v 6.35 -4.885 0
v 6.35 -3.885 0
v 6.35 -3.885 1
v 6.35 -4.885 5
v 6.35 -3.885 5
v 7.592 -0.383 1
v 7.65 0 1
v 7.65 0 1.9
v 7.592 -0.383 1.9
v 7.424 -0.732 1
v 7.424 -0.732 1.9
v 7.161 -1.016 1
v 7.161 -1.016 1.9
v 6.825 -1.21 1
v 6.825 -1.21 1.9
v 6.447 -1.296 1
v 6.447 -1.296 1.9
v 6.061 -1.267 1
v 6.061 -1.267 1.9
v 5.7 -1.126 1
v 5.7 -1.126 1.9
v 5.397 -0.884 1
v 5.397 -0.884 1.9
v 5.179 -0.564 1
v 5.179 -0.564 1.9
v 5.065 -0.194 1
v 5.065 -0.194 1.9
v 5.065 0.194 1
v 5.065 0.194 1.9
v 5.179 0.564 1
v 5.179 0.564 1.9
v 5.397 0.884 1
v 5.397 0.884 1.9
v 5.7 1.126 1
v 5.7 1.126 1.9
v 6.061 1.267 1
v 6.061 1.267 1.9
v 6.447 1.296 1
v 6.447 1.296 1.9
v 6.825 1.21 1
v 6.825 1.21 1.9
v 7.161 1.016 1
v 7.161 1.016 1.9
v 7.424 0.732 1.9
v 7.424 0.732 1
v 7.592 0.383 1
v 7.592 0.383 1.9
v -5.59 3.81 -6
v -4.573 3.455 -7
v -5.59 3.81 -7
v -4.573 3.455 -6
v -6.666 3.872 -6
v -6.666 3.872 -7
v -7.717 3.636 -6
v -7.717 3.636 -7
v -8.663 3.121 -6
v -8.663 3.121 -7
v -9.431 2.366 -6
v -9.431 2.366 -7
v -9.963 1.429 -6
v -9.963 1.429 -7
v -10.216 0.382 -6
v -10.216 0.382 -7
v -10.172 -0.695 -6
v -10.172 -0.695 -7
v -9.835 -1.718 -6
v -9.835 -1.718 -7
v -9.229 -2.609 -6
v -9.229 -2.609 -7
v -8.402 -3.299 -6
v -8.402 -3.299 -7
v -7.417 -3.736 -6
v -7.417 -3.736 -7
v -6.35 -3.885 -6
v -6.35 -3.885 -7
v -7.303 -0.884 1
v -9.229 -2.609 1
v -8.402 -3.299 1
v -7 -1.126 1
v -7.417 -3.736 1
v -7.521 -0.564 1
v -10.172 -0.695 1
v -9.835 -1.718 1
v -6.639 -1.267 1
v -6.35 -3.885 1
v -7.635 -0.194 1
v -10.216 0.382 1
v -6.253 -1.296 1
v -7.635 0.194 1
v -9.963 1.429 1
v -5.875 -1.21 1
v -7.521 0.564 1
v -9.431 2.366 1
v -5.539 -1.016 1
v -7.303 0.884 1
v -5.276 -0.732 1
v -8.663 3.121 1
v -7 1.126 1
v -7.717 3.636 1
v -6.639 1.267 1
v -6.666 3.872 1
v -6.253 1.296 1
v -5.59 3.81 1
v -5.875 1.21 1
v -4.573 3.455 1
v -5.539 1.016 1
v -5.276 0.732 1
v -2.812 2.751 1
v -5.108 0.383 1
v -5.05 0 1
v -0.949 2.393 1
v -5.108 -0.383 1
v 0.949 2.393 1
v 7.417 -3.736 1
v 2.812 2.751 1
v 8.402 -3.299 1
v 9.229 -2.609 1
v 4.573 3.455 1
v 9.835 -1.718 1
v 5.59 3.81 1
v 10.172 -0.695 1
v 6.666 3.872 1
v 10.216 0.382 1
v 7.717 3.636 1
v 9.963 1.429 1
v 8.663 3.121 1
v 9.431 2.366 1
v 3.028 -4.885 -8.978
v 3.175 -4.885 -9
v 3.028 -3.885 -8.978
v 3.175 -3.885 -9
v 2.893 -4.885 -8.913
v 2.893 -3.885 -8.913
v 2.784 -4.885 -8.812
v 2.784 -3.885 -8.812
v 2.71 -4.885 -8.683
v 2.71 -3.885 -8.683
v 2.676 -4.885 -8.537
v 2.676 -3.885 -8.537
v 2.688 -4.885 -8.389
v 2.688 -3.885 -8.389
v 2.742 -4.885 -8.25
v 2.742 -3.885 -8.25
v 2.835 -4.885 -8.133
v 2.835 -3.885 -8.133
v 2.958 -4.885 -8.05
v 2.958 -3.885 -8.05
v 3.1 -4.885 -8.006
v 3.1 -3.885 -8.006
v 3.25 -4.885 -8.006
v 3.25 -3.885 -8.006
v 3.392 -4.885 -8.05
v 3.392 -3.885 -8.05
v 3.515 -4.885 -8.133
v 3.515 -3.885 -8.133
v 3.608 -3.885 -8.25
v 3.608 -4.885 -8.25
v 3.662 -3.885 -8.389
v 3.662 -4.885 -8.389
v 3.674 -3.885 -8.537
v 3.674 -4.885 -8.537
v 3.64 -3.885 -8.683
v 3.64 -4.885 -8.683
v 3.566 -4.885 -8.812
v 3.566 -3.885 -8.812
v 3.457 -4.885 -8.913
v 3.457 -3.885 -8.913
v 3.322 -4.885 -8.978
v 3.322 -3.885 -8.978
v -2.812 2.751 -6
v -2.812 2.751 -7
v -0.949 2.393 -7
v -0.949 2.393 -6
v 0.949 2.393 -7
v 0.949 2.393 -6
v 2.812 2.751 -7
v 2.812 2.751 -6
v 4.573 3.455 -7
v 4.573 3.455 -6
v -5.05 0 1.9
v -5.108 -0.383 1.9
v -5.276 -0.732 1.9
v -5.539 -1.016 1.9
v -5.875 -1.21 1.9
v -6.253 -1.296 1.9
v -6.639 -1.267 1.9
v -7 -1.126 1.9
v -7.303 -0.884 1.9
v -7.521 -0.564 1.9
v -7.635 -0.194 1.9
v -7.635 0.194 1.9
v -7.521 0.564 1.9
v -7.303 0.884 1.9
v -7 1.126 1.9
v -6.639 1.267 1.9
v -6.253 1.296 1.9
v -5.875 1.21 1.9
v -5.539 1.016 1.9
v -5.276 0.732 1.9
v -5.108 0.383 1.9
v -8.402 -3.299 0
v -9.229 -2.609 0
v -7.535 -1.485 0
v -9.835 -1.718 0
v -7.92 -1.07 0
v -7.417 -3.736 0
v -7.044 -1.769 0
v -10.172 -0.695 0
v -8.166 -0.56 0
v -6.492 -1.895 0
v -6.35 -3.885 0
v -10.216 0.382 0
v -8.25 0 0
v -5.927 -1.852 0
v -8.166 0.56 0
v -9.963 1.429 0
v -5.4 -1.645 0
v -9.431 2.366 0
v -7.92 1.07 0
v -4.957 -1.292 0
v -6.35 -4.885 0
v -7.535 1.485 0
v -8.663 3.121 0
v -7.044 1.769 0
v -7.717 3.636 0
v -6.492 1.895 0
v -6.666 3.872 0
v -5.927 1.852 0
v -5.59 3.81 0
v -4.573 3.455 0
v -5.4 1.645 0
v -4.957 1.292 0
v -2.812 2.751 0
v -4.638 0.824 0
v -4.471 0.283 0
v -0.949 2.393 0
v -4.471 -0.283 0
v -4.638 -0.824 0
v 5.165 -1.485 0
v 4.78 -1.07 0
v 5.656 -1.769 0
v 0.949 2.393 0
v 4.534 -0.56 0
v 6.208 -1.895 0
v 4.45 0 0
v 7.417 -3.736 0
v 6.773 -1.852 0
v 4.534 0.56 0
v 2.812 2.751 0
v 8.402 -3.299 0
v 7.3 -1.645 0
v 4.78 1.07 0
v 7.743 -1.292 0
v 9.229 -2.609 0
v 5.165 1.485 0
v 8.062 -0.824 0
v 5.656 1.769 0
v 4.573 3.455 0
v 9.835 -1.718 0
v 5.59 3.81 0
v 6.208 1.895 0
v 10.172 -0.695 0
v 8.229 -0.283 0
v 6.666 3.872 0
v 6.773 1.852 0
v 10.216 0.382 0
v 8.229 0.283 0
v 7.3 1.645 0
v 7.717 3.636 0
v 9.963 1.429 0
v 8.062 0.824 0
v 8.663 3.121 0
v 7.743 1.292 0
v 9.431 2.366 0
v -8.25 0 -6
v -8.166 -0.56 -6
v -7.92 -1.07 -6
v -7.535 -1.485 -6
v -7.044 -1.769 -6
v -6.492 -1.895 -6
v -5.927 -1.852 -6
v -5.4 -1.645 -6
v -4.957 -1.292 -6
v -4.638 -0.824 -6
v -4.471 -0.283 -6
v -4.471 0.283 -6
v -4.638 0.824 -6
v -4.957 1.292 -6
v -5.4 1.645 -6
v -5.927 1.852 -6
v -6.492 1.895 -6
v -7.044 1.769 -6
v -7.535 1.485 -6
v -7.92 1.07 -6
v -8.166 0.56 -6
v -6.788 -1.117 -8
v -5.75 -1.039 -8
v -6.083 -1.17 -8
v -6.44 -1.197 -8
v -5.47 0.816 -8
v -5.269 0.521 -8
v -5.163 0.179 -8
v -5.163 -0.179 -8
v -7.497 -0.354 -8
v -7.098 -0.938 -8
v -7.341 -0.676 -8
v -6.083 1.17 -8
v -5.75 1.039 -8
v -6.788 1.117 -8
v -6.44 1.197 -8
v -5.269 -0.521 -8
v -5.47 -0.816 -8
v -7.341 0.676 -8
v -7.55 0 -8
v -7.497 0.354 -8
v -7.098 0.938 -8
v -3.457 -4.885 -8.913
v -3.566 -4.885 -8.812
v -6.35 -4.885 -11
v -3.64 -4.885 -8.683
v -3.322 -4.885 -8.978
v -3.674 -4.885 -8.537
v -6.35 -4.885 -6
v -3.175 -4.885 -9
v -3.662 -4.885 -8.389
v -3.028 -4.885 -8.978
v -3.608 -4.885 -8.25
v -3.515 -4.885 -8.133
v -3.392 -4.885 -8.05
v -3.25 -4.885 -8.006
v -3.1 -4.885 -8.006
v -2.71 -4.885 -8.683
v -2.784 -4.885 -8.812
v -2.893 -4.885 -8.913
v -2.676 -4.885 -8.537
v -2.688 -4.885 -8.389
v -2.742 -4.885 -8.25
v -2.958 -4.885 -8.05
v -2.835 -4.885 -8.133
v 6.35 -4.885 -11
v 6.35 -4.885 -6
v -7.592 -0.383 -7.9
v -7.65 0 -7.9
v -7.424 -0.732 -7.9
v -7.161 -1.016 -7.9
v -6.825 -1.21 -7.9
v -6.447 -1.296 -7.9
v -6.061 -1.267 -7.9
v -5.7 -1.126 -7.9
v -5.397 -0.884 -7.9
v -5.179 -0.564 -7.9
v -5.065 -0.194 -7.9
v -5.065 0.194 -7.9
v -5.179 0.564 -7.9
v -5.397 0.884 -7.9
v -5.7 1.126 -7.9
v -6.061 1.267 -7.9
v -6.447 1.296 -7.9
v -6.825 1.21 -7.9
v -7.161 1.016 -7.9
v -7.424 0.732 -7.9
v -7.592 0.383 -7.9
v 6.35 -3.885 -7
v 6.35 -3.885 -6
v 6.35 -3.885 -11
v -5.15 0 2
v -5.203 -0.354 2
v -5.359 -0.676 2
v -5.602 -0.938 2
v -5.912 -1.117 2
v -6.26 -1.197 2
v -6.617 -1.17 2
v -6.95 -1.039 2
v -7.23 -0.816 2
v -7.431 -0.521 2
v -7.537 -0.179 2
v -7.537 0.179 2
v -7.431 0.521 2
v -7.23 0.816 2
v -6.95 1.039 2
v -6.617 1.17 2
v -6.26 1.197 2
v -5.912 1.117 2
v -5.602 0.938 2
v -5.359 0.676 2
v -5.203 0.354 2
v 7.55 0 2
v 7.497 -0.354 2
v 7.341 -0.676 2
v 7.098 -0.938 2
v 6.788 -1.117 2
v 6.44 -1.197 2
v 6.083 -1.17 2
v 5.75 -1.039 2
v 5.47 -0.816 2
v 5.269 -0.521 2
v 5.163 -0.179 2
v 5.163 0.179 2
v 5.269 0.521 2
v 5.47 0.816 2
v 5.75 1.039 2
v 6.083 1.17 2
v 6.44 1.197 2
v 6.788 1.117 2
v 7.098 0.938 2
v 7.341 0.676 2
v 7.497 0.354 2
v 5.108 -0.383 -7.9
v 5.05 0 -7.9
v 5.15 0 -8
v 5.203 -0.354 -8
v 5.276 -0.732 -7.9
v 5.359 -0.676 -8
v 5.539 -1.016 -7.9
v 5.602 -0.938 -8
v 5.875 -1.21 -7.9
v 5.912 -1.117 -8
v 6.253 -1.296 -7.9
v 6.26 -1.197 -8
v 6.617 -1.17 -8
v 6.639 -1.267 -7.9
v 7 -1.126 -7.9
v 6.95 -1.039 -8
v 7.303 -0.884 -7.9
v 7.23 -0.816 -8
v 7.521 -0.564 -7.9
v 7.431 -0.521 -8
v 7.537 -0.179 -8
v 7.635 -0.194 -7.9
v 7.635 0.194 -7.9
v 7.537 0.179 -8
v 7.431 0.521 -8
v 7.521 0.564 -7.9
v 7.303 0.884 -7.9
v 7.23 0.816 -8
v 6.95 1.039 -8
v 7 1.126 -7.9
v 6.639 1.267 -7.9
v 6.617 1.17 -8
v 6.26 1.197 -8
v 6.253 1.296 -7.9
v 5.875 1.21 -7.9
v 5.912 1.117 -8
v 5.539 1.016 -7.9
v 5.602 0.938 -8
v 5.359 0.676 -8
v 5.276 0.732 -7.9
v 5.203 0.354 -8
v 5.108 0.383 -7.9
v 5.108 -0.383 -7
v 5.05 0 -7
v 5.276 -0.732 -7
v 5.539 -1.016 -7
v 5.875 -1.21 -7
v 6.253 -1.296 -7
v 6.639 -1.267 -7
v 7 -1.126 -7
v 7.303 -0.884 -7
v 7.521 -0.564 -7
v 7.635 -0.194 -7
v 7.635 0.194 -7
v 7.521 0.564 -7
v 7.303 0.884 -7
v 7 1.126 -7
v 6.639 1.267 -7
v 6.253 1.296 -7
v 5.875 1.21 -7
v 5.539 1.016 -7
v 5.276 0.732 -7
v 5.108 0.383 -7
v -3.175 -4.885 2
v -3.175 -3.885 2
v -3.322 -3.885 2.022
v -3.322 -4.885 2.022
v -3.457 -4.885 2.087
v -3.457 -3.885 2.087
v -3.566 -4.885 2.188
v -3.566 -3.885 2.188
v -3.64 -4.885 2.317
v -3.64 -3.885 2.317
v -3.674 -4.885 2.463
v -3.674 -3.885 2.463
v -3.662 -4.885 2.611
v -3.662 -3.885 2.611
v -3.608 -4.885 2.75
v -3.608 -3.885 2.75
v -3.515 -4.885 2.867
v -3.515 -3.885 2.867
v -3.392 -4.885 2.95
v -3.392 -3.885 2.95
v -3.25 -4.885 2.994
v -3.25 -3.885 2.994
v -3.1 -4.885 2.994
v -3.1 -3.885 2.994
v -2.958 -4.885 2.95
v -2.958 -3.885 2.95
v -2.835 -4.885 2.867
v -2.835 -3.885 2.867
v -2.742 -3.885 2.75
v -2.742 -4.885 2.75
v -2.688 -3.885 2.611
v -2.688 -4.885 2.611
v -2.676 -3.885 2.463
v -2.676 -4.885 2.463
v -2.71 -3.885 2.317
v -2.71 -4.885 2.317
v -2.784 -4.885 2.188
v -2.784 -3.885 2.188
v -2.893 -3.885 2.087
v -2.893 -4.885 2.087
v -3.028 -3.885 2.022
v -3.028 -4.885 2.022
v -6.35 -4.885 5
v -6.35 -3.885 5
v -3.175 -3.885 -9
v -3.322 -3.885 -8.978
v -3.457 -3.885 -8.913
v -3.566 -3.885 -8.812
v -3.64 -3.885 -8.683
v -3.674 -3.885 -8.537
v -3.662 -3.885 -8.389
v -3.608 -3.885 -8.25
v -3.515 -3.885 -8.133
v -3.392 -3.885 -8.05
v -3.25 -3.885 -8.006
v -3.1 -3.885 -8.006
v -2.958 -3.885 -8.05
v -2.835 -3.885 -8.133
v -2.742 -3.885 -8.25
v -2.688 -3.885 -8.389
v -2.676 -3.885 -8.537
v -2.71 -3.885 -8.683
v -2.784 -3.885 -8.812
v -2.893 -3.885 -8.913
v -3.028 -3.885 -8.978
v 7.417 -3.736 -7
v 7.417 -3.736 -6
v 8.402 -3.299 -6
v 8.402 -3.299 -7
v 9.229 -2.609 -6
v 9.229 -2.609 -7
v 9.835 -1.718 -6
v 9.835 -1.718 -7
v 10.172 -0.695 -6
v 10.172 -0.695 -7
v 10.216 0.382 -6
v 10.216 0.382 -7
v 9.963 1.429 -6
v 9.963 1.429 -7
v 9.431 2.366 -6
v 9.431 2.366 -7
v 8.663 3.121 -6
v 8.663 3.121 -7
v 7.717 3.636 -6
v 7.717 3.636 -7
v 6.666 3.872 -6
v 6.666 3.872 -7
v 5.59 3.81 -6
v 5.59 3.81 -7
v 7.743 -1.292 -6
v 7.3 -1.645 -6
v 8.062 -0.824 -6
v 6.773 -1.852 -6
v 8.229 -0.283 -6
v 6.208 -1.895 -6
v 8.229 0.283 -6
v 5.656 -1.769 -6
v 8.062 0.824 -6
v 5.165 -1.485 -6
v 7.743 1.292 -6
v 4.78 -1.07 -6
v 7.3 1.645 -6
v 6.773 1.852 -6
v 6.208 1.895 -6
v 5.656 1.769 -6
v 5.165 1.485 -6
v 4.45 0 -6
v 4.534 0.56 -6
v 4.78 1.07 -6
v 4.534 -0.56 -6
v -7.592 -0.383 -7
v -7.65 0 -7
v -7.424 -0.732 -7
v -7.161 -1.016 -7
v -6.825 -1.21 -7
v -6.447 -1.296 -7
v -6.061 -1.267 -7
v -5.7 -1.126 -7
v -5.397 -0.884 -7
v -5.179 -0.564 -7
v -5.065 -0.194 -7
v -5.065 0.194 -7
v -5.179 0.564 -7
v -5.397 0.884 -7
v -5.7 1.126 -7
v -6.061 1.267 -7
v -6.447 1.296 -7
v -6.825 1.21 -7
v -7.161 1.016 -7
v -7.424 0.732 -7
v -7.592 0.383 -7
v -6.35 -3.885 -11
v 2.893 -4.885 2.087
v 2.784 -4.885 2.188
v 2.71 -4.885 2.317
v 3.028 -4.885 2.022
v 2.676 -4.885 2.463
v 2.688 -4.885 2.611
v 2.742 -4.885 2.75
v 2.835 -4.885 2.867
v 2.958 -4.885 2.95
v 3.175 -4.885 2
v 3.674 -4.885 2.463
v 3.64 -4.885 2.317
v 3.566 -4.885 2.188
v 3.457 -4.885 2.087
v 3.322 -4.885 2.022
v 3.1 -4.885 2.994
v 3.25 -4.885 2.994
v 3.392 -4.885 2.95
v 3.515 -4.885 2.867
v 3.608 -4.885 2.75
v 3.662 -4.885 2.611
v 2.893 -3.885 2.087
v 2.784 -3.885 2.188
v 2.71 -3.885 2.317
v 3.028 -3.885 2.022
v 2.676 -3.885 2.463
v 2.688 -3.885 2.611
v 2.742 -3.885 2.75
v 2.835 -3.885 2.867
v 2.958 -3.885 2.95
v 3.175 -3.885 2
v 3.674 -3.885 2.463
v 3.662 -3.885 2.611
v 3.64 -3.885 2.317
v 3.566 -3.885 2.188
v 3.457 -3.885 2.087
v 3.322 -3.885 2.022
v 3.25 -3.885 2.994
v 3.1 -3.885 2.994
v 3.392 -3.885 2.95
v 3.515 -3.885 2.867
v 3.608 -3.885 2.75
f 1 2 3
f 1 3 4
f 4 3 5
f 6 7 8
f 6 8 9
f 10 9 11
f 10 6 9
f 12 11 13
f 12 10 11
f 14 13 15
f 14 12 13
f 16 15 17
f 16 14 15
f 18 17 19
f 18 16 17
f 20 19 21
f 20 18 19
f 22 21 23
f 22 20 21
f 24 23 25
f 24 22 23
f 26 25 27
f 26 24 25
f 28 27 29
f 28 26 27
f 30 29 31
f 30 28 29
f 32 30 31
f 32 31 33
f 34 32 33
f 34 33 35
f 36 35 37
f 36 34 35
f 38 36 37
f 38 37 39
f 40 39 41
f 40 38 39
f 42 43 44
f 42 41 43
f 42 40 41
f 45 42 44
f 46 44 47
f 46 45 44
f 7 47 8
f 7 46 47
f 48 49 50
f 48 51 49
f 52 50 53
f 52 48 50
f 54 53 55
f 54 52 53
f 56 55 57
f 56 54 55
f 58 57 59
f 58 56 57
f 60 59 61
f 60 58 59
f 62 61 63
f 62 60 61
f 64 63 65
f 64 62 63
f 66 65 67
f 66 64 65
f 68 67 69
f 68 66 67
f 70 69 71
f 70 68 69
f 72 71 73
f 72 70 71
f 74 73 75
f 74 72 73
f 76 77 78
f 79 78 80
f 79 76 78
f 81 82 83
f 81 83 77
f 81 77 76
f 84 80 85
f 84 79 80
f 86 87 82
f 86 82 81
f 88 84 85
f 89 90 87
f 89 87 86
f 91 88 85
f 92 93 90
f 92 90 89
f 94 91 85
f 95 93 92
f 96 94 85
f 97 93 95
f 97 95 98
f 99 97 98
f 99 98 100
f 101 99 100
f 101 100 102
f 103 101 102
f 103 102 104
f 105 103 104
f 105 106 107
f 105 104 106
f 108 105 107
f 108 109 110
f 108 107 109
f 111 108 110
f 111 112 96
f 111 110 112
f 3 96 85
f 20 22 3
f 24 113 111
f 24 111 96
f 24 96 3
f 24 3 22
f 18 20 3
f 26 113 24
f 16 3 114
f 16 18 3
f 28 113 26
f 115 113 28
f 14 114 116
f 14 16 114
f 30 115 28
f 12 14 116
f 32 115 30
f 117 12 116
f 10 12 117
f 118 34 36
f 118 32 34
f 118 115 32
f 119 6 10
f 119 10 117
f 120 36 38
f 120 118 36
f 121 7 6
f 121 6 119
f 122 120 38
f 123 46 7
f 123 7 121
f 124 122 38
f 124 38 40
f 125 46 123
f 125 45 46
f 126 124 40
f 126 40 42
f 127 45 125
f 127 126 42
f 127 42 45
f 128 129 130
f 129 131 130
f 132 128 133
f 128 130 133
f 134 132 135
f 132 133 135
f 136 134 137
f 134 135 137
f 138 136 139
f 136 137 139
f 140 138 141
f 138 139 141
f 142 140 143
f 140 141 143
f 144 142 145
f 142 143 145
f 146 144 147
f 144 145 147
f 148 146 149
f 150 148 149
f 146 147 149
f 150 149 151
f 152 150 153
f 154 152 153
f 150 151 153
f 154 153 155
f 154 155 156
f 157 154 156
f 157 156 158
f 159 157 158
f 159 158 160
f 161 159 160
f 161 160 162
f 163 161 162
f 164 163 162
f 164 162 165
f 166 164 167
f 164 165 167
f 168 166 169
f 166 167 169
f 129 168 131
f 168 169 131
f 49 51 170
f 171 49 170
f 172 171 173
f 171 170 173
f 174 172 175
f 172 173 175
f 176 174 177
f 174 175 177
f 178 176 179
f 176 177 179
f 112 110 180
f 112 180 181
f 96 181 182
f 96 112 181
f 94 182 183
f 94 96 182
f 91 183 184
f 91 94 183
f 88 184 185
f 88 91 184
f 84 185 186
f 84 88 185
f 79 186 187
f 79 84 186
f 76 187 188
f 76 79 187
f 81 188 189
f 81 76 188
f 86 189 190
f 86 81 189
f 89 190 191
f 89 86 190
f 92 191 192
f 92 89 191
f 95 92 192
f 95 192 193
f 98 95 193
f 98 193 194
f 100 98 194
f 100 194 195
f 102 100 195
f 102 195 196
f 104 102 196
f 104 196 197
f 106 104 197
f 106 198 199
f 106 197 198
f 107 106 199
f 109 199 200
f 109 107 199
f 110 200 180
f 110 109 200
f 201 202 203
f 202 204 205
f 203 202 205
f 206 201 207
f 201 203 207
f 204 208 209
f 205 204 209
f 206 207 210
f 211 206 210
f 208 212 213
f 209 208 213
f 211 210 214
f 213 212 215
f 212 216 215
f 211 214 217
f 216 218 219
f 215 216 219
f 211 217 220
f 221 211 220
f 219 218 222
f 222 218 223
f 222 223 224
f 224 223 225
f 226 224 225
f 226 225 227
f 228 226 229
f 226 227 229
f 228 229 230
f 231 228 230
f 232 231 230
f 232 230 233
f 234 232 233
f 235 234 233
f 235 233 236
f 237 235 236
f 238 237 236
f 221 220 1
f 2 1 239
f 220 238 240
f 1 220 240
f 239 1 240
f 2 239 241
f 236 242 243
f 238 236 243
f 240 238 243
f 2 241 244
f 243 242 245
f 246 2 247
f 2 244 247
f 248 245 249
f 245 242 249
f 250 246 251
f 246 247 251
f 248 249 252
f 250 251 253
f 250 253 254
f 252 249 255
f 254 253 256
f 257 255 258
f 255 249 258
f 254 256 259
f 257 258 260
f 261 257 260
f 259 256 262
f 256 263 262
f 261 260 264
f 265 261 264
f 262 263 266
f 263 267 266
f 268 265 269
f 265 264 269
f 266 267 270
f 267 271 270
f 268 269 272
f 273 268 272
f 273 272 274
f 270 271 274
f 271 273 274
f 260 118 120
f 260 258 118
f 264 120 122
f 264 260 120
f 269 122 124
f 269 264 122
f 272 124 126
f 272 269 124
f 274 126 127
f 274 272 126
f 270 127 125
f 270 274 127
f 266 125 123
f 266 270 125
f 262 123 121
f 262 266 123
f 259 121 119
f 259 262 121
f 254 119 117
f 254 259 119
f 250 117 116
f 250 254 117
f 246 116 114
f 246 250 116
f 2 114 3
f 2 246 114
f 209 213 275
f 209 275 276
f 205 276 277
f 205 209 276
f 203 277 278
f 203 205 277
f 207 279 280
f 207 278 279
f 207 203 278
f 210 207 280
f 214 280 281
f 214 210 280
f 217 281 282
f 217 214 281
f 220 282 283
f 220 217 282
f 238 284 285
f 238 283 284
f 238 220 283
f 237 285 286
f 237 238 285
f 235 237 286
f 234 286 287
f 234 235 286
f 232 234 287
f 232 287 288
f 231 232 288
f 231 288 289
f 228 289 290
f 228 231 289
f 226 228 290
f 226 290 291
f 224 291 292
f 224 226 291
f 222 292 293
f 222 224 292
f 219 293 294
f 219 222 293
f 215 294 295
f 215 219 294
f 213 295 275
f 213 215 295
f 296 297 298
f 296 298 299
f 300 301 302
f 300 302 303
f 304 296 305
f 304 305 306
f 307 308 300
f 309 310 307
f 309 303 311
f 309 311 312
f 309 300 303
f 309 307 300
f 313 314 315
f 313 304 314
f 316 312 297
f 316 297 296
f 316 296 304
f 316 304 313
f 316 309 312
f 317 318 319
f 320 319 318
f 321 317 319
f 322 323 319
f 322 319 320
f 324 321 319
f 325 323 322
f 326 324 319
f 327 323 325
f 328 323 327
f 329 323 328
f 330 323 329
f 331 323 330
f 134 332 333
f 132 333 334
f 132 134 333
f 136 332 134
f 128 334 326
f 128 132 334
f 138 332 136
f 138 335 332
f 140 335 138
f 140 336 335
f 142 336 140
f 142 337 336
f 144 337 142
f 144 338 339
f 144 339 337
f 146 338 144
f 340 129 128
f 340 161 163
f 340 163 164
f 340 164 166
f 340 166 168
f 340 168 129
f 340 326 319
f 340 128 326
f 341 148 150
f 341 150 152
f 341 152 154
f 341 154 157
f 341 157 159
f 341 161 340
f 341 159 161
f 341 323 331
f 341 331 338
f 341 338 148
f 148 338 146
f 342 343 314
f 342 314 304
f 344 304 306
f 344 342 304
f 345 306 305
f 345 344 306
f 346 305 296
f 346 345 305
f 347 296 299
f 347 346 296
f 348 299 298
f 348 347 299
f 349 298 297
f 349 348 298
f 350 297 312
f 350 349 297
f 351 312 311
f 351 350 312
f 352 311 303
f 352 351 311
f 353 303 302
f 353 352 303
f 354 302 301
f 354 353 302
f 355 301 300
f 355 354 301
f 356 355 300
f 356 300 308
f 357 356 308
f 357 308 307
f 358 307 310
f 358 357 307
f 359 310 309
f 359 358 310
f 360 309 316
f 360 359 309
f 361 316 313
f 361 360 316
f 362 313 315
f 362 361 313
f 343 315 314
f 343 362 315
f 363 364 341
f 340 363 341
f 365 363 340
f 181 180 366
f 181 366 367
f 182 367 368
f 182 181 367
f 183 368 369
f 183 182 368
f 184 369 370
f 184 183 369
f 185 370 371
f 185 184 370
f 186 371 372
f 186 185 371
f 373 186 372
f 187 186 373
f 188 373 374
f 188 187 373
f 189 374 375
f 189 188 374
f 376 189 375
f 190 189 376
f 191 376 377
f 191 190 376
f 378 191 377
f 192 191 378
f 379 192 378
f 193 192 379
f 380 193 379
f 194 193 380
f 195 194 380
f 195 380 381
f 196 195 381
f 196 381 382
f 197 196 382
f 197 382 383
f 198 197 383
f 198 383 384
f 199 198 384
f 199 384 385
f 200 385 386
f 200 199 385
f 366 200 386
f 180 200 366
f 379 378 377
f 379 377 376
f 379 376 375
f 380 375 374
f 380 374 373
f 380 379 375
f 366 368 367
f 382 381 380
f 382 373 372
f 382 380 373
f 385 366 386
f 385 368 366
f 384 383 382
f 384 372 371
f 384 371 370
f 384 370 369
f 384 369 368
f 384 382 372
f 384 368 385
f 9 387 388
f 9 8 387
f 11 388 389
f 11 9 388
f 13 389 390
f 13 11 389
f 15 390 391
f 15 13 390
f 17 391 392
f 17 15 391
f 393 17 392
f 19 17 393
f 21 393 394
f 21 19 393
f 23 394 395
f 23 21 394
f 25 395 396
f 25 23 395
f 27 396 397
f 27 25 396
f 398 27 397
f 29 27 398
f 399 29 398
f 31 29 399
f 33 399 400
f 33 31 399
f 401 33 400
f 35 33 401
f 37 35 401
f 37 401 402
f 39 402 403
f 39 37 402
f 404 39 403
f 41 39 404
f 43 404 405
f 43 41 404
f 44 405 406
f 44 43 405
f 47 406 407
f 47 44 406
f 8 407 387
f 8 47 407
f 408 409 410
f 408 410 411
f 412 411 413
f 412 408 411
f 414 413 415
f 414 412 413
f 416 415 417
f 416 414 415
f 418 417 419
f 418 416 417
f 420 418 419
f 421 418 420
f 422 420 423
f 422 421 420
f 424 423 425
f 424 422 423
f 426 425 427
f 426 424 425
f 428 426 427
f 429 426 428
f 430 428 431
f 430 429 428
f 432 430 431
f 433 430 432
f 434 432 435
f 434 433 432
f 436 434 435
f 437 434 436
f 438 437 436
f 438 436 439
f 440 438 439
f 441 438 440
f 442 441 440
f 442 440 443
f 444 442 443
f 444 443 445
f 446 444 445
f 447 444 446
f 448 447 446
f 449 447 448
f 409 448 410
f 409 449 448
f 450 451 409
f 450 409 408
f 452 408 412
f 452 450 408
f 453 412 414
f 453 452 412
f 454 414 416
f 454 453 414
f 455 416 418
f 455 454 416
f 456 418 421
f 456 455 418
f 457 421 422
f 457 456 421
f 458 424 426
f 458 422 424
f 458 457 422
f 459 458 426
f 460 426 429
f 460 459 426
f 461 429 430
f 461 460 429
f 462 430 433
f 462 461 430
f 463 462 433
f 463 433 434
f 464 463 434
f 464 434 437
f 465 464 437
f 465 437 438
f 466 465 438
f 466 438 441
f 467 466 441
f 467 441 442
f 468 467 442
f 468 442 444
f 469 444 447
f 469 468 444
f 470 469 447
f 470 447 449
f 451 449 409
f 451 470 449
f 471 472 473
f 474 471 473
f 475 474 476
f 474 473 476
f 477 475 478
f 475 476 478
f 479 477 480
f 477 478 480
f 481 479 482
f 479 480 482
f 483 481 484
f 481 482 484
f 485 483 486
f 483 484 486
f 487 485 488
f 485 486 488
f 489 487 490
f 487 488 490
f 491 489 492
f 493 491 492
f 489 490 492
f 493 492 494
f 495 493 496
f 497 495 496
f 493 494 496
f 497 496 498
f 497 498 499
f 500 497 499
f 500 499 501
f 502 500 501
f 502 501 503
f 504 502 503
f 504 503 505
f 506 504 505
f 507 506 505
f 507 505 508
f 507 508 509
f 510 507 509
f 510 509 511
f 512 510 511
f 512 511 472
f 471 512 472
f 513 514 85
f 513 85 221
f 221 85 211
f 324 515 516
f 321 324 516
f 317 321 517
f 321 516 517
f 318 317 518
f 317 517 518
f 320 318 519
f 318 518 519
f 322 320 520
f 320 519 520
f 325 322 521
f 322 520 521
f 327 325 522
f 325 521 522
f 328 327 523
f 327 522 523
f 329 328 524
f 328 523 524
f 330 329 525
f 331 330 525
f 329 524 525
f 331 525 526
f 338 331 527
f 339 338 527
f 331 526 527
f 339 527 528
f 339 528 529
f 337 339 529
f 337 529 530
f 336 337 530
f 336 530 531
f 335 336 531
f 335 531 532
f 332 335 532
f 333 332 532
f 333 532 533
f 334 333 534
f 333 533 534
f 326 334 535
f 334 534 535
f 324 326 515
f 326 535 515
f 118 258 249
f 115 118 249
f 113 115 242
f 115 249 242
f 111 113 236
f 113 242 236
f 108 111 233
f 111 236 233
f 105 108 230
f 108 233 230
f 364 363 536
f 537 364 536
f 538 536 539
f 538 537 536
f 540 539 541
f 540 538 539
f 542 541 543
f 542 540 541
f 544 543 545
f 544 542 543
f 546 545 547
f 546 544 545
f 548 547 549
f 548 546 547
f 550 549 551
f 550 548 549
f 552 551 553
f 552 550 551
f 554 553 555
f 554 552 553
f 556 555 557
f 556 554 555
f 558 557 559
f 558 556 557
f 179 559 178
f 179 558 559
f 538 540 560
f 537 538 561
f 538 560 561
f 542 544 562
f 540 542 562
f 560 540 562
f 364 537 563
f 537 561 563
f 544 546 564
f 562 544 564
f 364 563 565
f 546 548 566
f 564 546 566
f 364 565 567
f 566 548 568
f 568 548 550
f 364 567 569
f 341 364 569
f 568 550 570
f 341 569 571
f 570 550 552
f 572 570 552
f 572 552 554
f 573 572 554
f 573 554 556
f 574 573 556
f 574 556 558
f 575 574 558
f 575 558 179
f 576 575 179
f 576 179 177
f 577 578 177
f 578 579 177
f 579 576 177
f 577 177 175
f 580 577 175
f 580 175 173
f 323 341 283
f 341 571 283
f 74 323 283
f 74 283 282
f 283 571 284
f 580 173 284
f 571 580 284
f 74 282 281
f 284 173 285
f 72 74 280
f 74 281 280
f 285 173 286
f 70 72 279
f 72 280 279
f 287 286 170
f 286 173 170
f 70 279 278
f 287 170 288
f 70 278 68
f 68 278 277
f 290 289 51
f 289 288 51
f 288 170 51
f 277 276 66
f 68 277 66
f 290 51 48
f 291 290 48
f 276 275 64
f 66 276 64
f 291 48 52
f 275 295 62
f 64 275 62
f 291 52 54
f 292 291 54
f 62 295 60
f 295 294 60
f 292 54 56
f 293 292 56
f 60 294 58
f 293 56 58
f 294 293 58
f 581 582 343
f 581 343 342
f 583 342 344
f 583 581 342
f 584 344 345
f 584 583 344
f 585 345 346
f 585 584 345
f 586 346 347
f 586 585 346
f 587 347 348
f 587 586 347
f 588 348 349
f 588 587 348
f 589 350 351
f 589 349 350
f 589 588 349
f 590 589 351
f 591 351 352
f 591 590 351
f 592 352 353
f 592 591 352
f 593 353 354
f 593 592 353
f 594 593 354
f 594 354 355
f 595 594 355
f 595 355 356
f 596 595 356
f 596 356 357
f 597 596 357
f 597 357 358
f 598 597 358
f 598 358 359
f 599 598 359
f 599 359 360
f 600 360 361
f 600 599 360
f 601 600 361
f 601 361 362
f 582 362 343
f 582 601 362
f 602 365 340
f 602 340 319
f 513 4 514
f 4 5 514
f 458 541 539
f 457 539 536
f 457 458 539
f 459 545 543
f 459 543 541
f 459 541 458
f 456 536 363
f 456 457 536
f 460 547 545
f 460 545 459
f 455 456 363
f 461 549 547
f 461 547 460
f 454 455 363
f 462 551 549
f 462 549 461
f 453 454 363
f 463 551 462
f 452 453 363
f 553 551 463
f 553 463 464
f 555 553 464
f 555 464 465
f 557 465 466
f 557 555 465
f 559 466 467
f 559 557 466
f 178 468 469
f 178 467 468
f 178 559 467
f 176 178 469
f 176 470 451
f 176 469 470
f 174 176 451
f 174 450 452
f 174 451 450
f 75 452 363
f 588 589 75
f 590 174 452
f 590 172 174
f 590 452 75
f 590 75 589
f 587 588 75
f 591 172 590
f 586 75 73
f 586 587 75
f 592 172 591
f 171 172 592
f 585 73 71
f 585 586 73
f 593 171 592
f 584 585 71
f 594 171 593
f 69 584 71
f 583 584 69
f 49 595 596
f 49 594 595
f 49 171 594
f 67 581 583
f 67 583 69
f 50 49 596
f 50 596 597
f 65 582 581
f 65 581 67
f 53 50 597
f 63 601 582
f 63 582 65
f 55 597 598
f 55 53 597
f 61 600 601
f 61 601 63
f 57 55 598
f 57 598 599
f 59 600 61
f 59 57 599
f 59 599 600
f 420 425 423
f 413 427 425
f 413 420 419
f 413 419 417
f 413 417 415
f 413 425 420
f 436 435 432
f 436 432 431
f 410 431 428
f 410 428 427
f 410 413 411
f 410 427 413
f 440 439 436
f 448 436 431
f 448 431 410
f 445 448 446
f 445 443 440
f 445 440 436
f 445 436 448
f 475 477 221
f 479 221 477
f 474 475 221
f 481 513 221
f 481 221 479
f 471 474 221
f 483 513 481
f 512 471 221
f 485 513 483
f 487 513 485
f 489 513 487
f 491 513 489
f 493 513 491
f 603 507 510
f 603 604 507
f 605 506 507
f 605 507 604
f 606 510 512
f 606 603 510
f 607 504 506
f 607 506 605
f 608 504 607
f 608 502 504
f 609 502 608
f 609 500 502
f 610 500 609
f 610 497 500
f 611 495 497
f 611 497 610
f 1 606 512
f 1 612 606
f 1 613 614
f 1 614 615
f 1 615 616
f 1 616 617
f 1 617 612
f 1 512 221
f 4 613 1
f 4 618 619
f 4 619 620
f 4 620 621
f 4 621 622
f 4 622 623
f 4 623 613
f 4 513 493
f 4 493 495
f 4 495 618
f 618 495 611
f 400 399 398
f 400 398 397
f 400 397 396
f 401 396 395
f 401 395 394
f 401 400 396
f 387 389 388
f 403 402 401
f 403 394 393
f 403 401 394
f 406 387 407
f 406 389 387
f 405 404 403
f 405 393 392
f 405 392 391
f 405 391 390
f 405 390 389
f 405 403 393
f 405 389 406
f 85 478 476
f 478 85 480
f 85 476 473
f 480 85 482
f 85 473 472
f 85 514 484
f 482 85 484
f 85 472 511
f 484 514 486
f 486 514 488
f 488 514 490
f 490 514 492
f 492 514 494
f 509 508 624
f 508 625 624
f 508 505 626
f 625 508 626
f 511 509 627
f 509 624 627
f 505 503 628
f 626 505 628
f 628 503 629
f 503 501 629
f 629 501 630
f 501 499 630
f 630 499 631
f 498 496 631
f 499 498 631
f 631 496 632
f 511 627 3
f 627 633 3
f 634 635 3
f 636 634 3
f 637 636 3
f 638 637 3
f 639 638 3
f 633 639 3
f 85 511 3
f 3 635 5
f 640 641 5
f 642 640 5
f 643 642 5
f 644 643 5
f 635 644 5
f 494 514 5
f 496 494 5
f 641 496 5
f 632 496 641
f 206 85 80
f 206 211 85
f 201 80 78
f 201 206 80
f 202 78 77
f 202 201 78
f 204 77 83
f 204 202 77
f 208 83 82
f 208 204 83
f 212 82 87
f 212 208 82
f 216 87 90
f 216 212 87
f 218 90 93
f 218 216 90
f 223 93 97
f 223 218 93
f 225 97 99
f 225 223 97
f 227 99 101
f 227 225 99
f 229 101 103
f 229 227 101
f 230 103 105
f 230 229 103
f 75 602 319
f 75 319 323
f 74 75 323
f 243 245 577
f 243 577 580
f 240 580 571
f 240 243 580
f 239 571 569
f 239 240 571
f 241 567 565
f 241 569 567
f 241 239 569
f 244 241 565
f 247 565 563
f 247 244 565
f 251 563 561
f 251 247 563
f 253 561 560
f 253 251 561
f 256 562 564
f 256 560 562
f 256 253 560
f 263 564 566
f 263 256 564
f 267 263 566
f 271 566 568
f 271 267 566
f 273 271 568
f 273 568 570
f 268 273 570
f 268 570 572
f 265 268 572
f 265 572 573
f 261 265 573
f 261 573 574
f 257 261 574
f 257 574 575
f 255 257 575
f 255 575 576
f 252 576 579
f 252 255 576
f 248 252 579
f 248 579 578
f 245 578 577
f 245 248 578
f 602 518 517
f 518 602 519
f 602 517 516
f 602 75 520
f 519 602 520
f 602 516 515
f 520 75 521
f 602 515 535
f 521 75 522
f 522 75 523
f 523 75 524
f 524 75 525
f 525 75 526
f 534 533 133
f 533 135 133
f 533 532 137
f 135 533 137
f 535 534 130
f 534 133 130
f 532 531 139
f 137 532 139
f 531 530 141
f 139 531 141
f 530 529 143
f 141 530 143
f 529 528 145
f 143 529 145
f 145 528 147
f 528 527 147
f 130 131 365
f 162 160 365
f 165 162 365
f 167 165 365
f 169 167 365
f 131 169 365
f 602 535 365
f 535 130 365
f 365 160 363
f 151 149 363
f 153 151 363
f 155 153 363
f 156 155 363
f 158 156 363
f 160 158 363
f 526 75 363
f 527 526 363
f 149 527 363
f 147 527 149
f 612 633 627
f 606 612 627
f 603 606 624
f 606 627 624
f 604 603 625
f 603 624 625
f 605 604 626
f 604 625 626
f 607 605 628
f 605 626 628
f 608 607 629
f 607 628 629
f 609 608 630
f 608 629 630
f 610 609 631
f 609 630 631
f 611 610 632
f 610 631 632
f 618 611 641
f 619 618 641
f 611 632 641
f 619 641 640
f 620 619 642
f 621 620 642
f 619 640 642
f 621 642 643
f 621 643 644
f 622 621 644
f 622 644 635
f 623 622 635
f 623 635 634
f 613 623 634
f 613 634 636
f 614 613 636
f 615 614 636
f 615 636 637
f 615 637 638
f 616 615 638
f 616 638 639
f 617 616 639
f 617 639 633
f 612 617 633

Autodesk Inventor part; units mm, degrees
ref_plane "YZ Plane" through (0, 0, 0) normal (1, 0, 0) x (0, 1, 0)
ref_plane "XZ Plane" through (0, 0, 0) normal (0, 1, 0) x (-1, 0, 0)
sketch "Sketch1" plane through (0, 0, 0) normal (0, 0, 1) x (1, 0, 0)
  circle A0 centre (-6.35, 0) radius 3.885
  circle A1 centre (6.35, 0) radius 3.885
  arc A2 (-4.5733, 3.4549) -> (4.5733, 3.4549) centre (0, 12.3479) ccw
  line L0 (-6.35, -3.885) -> (6.35, -3.885)
  point P0 (0, 0)
  dimension "d0" = 7.77
  dimension "d1" = 6.35
  dimension "d2" = 7.77
  dimension "d3" = 6.35
  dimension "d4" = 20
  dimension "d5" = 0
  dimension "d6" = 0
extrude "Extrusion1" add sketch "Sketch1" along normal blind 1
sketch "Sketch2" plane through (0, 0, 0) normal (0, 0, -1) x (-1, 0, 0)
  arc A0 (-4.5733, 3.4549) -> (-6.35, -3.885) centre (-6.35, 0) ccw projected
  arc A1 (6.35, -3.885) -> (4.5733, 3.4549) centre (6.35, 0) ccw projected
  circle A2 centre (-6.35, 0) radius 1.9
  circle A3 centre (6.35, 0) radius 1.9
  point P0 (-4.5733, -3.4549)
  point P1 (4.5733, -3.4549)
  point P2 (0, 0)
  dimension "d10" = 3.8
  dimension "d11" = 3.8
extrude "Extrusion2" add sketch "Sketch2" along normal blind 6
sketch "Sketch3" plane through (-6.35, 0, -6) normal (0, 0, -1) x (-1, 0, 0)
  circle A0 centre (-12.7, 0) radius 1.9 projected
  circle A1 centre (0, 0) radius 1.9 projected
  arc A2 (-10.9233, 3.4549) -> (-1.7767, 3.4549) centre (-6.35, 12.3479) ccw projected
  arc A3 (-10.9233, 3.4549) -> (-12.7, -3.885) centre (-12.7, 0) ccw projected
  arc A4 (0, -3.885) -> (-1.7767, 3.4549) centre (0, 0) ccw projected
  line L0 (0, -3.885) -> (-12.7, -3.885) projected
  point P0 (-6.35, 0)
extrude "Extrusion3" add sketch "Sketch3" along normal blind 1 contours A0 | A1 | A2 A4 L0 A3
sketch "Sketch4" plane through (0, 0, 1) normal (0, 0, 1) x (1, 0, 0)
  arc A0 (-4.5733, 3.4549) -> (-6.35, -3.885) centre (-6.35, 0) ccw projected
  arc A1 (6.35, -3.885) -> (4.5733, 3.4549) centre (6.35, 0) ccw projected
  circle A2 centre (-6.35, 0) radius 1.3
  circle A3 centre (6.35, 0) radius 1.3
  point P0 (-4.5733, -3.4549)
  point P1 (4.5733, -3.4549)
  point P2 (0, 0)
  dimension "d16" = 2.6
  dimension "d17" = 2.6
extrude "Extrusion4" add sketch "Sketch4" along normal blind 1
sketch "Sketch5" plane through (-6.35, 0, -7) normal (0, 0, -1) x (-1, 0, 0)
  arc A0 (-10.9233, 3.4549) -> (-12.7, -3.885) centre (-12.7, 0) ccw projected
  arc A1 (0, -3.885) -> (-1.7767, 3.4549) centre (0, 0) ccw projected
  circle A2 centre (-12.7, 0) radius 1.3
  circle A3 centre (0, 0) radius 1.3
  point P0 (-10.9233, -3.4549)
  point P1 (-1.7767, -3.4549)
  point P2 (-6.35, 0)
  dimension "d20" = 2.6
  dimension "d21" = 2.6
extrude "Extrusion5" add sketch "Sketch5" along normal blind 1
chamfer "Chamfer1" distance 0.1 angle 45 2 edges at (7.65, 0, -8) (-5.05, 0, -8)
chamfer "Chamfer2" distance 0.1 angle 45 2 edges at (5.05, 0, 2) (-7.65, 0, 2)
ref_plane "Work Plane1" through (0, 0, -3) normal (0, 0, 1) x (1, 0, 0)
sketch "Skizze6" plane through (-6.35, -3.885, 0) normal (0, -1, 0) x (1, 0, 0)
  line L0 (0, 0) -> (12.7, 0)
  line L1 (12.7, 0) -> (12.7, 5)
  line L2 (12.7, 5) -> (0, 5)
  line L3 (0, 5) -> (0, 0)
  line L4 (0, -6) -> (0, -7) projected
  line L5 (0, -6) -> (12.7, -6)
  line L6 (12.7, -6) -> (12.7, -11)
  line L7 (12.7, -11) -> (0, -11)
  line L8 (0, -11) -> (0, -6)
  point P0 (6.35, 0)
  dimension "d31" = 5
  dimension "d32" = 12.7
  dimension "d33" = 12.7
  dimension "d34" = 5
extrude "Extrusion6" add sketch "Skizze6" along normal blind 1
sketch "Skizze7" plane through (-6.35, -4.885, 0) normal (0, -1, 0) x (1, 0, 0)
  line L0 (6.35, 0) -> (6.35, 2.5)
  line L1 (6.35, 2.5) -> (3.175, 2.5)
  line L2 (6.35, 2.5) -> (9.525, 2.5)
  line L3 (10.9233, -6) -> (1.7767, -6) projected
  line L4 (6.35, -6) -> (6.35, -8.5)
  line L5 (6.35, -8.5) -> (3.175, -8.5)
  line L6 (6.35, -8.5) -> (9.525, -8.5)
  dimension "d37" = 2.5
  dimension "d38" = 3.175
  dimension "d39" = 3.175
  dimension "d40" = 2.5
  dimension "d41" = 3.175
  dimension "d42" = 3.175
hole "Bohrung1" at (3.175, -4.885, -8.5) at (-3.175, -4.885, -8.5) at (3.175, -4.885, 2.5) at (-3.175, -4.885, 2.5) direction (0, 1, 0) diameter 1 end through all
equation "\"d2\" = d0"
equation "\"d3\" = d1"
equation "\"d11\" = d10"
equation "\"d17\" = d16"
equation "\"d20\" = d16"
equation "\"d21\" = d16"
properties part number "ConnectingLinks"
